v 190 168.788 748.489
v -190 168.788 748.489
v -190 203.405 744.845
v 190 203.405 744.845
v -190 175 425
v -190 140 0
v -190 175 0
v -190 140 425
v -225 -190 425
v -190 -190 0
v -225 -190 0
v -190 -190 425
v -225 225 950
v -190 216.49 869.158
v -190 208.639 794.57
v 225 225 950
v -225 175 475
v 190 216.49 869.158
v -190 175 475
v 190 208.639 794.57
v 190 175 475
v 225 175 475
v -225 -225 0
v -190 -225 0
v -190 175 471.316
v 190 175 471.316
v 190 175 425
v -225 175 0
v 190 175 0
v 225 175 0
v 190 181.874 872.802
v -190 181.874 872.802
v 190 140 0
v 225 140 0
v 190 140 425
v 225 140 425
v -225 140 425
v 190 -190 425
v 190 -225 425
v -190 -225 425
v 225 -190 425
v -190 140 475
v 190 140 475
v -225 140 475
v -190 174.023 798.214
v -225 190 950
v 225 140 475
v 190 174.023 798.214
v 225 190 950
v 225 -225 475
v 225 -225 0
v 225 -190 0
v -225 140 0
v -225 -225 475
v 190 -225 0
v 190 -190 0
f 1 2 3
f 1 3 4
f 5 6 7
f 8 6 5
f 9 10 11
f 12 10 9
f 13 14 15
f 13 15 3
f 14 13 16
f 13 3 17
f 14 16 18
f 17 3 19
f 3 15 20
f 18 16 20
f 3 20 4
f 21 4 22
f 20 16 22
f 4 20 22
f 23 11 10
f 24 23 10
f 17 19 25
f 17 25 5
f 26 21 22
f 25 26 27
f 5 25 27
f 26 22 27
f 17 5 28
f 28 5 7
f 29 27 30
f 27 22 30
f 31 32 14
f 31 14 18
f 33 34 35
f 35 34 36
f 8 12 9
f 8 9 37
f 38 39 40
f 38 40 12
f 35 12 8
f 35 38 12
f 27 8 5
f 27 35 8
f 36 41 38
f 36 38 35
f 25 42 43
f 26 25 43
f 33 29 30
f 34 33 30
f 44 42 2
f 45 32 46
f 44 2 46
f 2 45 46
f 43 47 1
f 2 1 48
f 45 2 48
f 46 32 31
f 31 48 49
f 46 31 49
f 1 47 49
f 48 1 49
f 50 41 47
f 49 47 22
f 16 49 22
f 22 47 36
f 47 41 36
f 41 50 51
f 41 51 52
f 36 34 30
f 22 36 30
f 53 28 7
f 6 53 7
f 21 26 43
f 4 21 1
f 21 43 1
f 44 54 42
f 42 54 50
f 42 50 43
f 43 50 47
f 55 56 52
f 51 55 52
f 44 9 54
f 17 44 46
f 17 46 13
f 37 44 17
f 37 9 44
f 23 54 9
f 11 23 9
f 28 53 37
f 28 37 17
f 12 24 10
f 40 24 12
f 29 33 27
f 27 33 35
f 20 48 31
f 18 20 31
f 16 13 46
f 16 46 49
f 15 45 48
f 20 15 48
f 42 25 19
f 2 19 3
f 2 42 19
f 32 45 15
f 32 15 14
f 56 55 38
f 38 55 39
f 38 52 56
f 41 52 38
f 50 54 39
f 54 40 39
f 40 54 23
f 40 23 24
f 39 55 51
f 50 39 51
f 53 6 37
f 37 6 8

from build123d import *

# Parameters (mm, degrees)
F0_W     = 450
F0_H     = 450
F1_DEPTH = 950
F2_W     = 330
F2_H     = 425
F2_W_2   = 50
F3_DEPTH = 450.001
F4_W     = 380
F4_H     = 425
F5_DEPTH = 450.001
F6_W     = 380
F6_H     = 75
F6_H_2   = 275
F7_DEPTH = 134.2592361444


with BuildPart() as f1:
    # F0 (on Top) → F1 (new body)
    with BuildSketch(Plane.XY):
        Rectangle(F0_W, F0_H)
    extrude(amount=F1_DEPTH)

    # F2 (on face) → F3 (cut, through all)
    with BuildSketch(Plane.YZ.offset(225)):
        Polygon((225, 473.0396032333), (225, 475), (175, 475), (175, 425), (225, 425), align=None)
        Polygon((-225, 475), (140, 475), (190, 950), (-225, 950), (-225, 495.331287384), (-225, 493.3708906174), align=None)
        with Locations((-25, 212.5)):
            Rectangle(F2_W, F2_H)
        with Locations((200, 212.5)):
            Rectangle(F2_W_2, F2_H)
        Polygon((175, 475), (225, 475), (225, 950), align=None)
    extrude(amount=-F3_DEPTH, mode=Mode.SUBTRACT)

    # F4 (on face) → F5 (cut, through all)
    with BuildSketch(Plane.XZ.offset(225)):
        with Locations((0, 212.5)):
            Rectangle(F4_W, F4_H)
    extrude(amount=-F5_DEPTH, mode=Mode.SUBTRACT)

    # F6 (on face) → F7 (cut, through all)
    with BuildSketch(Plane(origin=(0, 89.0136986301, -9.3698630137), x_dir=(1, 0, 0), z_dir=(0, -0.9945054529, 0.1046847845))):
        with Locations((0, 849.5459599702)):
            Rectangle(F6_W, F6_H)
        with Locations((0, 624.5459599702)):
            Rectangle(F6_W, F6_H_2)
    extrude(amount=-F7_DEPTH, mode=Mode.SUBTRACT)


solid = f1.part
